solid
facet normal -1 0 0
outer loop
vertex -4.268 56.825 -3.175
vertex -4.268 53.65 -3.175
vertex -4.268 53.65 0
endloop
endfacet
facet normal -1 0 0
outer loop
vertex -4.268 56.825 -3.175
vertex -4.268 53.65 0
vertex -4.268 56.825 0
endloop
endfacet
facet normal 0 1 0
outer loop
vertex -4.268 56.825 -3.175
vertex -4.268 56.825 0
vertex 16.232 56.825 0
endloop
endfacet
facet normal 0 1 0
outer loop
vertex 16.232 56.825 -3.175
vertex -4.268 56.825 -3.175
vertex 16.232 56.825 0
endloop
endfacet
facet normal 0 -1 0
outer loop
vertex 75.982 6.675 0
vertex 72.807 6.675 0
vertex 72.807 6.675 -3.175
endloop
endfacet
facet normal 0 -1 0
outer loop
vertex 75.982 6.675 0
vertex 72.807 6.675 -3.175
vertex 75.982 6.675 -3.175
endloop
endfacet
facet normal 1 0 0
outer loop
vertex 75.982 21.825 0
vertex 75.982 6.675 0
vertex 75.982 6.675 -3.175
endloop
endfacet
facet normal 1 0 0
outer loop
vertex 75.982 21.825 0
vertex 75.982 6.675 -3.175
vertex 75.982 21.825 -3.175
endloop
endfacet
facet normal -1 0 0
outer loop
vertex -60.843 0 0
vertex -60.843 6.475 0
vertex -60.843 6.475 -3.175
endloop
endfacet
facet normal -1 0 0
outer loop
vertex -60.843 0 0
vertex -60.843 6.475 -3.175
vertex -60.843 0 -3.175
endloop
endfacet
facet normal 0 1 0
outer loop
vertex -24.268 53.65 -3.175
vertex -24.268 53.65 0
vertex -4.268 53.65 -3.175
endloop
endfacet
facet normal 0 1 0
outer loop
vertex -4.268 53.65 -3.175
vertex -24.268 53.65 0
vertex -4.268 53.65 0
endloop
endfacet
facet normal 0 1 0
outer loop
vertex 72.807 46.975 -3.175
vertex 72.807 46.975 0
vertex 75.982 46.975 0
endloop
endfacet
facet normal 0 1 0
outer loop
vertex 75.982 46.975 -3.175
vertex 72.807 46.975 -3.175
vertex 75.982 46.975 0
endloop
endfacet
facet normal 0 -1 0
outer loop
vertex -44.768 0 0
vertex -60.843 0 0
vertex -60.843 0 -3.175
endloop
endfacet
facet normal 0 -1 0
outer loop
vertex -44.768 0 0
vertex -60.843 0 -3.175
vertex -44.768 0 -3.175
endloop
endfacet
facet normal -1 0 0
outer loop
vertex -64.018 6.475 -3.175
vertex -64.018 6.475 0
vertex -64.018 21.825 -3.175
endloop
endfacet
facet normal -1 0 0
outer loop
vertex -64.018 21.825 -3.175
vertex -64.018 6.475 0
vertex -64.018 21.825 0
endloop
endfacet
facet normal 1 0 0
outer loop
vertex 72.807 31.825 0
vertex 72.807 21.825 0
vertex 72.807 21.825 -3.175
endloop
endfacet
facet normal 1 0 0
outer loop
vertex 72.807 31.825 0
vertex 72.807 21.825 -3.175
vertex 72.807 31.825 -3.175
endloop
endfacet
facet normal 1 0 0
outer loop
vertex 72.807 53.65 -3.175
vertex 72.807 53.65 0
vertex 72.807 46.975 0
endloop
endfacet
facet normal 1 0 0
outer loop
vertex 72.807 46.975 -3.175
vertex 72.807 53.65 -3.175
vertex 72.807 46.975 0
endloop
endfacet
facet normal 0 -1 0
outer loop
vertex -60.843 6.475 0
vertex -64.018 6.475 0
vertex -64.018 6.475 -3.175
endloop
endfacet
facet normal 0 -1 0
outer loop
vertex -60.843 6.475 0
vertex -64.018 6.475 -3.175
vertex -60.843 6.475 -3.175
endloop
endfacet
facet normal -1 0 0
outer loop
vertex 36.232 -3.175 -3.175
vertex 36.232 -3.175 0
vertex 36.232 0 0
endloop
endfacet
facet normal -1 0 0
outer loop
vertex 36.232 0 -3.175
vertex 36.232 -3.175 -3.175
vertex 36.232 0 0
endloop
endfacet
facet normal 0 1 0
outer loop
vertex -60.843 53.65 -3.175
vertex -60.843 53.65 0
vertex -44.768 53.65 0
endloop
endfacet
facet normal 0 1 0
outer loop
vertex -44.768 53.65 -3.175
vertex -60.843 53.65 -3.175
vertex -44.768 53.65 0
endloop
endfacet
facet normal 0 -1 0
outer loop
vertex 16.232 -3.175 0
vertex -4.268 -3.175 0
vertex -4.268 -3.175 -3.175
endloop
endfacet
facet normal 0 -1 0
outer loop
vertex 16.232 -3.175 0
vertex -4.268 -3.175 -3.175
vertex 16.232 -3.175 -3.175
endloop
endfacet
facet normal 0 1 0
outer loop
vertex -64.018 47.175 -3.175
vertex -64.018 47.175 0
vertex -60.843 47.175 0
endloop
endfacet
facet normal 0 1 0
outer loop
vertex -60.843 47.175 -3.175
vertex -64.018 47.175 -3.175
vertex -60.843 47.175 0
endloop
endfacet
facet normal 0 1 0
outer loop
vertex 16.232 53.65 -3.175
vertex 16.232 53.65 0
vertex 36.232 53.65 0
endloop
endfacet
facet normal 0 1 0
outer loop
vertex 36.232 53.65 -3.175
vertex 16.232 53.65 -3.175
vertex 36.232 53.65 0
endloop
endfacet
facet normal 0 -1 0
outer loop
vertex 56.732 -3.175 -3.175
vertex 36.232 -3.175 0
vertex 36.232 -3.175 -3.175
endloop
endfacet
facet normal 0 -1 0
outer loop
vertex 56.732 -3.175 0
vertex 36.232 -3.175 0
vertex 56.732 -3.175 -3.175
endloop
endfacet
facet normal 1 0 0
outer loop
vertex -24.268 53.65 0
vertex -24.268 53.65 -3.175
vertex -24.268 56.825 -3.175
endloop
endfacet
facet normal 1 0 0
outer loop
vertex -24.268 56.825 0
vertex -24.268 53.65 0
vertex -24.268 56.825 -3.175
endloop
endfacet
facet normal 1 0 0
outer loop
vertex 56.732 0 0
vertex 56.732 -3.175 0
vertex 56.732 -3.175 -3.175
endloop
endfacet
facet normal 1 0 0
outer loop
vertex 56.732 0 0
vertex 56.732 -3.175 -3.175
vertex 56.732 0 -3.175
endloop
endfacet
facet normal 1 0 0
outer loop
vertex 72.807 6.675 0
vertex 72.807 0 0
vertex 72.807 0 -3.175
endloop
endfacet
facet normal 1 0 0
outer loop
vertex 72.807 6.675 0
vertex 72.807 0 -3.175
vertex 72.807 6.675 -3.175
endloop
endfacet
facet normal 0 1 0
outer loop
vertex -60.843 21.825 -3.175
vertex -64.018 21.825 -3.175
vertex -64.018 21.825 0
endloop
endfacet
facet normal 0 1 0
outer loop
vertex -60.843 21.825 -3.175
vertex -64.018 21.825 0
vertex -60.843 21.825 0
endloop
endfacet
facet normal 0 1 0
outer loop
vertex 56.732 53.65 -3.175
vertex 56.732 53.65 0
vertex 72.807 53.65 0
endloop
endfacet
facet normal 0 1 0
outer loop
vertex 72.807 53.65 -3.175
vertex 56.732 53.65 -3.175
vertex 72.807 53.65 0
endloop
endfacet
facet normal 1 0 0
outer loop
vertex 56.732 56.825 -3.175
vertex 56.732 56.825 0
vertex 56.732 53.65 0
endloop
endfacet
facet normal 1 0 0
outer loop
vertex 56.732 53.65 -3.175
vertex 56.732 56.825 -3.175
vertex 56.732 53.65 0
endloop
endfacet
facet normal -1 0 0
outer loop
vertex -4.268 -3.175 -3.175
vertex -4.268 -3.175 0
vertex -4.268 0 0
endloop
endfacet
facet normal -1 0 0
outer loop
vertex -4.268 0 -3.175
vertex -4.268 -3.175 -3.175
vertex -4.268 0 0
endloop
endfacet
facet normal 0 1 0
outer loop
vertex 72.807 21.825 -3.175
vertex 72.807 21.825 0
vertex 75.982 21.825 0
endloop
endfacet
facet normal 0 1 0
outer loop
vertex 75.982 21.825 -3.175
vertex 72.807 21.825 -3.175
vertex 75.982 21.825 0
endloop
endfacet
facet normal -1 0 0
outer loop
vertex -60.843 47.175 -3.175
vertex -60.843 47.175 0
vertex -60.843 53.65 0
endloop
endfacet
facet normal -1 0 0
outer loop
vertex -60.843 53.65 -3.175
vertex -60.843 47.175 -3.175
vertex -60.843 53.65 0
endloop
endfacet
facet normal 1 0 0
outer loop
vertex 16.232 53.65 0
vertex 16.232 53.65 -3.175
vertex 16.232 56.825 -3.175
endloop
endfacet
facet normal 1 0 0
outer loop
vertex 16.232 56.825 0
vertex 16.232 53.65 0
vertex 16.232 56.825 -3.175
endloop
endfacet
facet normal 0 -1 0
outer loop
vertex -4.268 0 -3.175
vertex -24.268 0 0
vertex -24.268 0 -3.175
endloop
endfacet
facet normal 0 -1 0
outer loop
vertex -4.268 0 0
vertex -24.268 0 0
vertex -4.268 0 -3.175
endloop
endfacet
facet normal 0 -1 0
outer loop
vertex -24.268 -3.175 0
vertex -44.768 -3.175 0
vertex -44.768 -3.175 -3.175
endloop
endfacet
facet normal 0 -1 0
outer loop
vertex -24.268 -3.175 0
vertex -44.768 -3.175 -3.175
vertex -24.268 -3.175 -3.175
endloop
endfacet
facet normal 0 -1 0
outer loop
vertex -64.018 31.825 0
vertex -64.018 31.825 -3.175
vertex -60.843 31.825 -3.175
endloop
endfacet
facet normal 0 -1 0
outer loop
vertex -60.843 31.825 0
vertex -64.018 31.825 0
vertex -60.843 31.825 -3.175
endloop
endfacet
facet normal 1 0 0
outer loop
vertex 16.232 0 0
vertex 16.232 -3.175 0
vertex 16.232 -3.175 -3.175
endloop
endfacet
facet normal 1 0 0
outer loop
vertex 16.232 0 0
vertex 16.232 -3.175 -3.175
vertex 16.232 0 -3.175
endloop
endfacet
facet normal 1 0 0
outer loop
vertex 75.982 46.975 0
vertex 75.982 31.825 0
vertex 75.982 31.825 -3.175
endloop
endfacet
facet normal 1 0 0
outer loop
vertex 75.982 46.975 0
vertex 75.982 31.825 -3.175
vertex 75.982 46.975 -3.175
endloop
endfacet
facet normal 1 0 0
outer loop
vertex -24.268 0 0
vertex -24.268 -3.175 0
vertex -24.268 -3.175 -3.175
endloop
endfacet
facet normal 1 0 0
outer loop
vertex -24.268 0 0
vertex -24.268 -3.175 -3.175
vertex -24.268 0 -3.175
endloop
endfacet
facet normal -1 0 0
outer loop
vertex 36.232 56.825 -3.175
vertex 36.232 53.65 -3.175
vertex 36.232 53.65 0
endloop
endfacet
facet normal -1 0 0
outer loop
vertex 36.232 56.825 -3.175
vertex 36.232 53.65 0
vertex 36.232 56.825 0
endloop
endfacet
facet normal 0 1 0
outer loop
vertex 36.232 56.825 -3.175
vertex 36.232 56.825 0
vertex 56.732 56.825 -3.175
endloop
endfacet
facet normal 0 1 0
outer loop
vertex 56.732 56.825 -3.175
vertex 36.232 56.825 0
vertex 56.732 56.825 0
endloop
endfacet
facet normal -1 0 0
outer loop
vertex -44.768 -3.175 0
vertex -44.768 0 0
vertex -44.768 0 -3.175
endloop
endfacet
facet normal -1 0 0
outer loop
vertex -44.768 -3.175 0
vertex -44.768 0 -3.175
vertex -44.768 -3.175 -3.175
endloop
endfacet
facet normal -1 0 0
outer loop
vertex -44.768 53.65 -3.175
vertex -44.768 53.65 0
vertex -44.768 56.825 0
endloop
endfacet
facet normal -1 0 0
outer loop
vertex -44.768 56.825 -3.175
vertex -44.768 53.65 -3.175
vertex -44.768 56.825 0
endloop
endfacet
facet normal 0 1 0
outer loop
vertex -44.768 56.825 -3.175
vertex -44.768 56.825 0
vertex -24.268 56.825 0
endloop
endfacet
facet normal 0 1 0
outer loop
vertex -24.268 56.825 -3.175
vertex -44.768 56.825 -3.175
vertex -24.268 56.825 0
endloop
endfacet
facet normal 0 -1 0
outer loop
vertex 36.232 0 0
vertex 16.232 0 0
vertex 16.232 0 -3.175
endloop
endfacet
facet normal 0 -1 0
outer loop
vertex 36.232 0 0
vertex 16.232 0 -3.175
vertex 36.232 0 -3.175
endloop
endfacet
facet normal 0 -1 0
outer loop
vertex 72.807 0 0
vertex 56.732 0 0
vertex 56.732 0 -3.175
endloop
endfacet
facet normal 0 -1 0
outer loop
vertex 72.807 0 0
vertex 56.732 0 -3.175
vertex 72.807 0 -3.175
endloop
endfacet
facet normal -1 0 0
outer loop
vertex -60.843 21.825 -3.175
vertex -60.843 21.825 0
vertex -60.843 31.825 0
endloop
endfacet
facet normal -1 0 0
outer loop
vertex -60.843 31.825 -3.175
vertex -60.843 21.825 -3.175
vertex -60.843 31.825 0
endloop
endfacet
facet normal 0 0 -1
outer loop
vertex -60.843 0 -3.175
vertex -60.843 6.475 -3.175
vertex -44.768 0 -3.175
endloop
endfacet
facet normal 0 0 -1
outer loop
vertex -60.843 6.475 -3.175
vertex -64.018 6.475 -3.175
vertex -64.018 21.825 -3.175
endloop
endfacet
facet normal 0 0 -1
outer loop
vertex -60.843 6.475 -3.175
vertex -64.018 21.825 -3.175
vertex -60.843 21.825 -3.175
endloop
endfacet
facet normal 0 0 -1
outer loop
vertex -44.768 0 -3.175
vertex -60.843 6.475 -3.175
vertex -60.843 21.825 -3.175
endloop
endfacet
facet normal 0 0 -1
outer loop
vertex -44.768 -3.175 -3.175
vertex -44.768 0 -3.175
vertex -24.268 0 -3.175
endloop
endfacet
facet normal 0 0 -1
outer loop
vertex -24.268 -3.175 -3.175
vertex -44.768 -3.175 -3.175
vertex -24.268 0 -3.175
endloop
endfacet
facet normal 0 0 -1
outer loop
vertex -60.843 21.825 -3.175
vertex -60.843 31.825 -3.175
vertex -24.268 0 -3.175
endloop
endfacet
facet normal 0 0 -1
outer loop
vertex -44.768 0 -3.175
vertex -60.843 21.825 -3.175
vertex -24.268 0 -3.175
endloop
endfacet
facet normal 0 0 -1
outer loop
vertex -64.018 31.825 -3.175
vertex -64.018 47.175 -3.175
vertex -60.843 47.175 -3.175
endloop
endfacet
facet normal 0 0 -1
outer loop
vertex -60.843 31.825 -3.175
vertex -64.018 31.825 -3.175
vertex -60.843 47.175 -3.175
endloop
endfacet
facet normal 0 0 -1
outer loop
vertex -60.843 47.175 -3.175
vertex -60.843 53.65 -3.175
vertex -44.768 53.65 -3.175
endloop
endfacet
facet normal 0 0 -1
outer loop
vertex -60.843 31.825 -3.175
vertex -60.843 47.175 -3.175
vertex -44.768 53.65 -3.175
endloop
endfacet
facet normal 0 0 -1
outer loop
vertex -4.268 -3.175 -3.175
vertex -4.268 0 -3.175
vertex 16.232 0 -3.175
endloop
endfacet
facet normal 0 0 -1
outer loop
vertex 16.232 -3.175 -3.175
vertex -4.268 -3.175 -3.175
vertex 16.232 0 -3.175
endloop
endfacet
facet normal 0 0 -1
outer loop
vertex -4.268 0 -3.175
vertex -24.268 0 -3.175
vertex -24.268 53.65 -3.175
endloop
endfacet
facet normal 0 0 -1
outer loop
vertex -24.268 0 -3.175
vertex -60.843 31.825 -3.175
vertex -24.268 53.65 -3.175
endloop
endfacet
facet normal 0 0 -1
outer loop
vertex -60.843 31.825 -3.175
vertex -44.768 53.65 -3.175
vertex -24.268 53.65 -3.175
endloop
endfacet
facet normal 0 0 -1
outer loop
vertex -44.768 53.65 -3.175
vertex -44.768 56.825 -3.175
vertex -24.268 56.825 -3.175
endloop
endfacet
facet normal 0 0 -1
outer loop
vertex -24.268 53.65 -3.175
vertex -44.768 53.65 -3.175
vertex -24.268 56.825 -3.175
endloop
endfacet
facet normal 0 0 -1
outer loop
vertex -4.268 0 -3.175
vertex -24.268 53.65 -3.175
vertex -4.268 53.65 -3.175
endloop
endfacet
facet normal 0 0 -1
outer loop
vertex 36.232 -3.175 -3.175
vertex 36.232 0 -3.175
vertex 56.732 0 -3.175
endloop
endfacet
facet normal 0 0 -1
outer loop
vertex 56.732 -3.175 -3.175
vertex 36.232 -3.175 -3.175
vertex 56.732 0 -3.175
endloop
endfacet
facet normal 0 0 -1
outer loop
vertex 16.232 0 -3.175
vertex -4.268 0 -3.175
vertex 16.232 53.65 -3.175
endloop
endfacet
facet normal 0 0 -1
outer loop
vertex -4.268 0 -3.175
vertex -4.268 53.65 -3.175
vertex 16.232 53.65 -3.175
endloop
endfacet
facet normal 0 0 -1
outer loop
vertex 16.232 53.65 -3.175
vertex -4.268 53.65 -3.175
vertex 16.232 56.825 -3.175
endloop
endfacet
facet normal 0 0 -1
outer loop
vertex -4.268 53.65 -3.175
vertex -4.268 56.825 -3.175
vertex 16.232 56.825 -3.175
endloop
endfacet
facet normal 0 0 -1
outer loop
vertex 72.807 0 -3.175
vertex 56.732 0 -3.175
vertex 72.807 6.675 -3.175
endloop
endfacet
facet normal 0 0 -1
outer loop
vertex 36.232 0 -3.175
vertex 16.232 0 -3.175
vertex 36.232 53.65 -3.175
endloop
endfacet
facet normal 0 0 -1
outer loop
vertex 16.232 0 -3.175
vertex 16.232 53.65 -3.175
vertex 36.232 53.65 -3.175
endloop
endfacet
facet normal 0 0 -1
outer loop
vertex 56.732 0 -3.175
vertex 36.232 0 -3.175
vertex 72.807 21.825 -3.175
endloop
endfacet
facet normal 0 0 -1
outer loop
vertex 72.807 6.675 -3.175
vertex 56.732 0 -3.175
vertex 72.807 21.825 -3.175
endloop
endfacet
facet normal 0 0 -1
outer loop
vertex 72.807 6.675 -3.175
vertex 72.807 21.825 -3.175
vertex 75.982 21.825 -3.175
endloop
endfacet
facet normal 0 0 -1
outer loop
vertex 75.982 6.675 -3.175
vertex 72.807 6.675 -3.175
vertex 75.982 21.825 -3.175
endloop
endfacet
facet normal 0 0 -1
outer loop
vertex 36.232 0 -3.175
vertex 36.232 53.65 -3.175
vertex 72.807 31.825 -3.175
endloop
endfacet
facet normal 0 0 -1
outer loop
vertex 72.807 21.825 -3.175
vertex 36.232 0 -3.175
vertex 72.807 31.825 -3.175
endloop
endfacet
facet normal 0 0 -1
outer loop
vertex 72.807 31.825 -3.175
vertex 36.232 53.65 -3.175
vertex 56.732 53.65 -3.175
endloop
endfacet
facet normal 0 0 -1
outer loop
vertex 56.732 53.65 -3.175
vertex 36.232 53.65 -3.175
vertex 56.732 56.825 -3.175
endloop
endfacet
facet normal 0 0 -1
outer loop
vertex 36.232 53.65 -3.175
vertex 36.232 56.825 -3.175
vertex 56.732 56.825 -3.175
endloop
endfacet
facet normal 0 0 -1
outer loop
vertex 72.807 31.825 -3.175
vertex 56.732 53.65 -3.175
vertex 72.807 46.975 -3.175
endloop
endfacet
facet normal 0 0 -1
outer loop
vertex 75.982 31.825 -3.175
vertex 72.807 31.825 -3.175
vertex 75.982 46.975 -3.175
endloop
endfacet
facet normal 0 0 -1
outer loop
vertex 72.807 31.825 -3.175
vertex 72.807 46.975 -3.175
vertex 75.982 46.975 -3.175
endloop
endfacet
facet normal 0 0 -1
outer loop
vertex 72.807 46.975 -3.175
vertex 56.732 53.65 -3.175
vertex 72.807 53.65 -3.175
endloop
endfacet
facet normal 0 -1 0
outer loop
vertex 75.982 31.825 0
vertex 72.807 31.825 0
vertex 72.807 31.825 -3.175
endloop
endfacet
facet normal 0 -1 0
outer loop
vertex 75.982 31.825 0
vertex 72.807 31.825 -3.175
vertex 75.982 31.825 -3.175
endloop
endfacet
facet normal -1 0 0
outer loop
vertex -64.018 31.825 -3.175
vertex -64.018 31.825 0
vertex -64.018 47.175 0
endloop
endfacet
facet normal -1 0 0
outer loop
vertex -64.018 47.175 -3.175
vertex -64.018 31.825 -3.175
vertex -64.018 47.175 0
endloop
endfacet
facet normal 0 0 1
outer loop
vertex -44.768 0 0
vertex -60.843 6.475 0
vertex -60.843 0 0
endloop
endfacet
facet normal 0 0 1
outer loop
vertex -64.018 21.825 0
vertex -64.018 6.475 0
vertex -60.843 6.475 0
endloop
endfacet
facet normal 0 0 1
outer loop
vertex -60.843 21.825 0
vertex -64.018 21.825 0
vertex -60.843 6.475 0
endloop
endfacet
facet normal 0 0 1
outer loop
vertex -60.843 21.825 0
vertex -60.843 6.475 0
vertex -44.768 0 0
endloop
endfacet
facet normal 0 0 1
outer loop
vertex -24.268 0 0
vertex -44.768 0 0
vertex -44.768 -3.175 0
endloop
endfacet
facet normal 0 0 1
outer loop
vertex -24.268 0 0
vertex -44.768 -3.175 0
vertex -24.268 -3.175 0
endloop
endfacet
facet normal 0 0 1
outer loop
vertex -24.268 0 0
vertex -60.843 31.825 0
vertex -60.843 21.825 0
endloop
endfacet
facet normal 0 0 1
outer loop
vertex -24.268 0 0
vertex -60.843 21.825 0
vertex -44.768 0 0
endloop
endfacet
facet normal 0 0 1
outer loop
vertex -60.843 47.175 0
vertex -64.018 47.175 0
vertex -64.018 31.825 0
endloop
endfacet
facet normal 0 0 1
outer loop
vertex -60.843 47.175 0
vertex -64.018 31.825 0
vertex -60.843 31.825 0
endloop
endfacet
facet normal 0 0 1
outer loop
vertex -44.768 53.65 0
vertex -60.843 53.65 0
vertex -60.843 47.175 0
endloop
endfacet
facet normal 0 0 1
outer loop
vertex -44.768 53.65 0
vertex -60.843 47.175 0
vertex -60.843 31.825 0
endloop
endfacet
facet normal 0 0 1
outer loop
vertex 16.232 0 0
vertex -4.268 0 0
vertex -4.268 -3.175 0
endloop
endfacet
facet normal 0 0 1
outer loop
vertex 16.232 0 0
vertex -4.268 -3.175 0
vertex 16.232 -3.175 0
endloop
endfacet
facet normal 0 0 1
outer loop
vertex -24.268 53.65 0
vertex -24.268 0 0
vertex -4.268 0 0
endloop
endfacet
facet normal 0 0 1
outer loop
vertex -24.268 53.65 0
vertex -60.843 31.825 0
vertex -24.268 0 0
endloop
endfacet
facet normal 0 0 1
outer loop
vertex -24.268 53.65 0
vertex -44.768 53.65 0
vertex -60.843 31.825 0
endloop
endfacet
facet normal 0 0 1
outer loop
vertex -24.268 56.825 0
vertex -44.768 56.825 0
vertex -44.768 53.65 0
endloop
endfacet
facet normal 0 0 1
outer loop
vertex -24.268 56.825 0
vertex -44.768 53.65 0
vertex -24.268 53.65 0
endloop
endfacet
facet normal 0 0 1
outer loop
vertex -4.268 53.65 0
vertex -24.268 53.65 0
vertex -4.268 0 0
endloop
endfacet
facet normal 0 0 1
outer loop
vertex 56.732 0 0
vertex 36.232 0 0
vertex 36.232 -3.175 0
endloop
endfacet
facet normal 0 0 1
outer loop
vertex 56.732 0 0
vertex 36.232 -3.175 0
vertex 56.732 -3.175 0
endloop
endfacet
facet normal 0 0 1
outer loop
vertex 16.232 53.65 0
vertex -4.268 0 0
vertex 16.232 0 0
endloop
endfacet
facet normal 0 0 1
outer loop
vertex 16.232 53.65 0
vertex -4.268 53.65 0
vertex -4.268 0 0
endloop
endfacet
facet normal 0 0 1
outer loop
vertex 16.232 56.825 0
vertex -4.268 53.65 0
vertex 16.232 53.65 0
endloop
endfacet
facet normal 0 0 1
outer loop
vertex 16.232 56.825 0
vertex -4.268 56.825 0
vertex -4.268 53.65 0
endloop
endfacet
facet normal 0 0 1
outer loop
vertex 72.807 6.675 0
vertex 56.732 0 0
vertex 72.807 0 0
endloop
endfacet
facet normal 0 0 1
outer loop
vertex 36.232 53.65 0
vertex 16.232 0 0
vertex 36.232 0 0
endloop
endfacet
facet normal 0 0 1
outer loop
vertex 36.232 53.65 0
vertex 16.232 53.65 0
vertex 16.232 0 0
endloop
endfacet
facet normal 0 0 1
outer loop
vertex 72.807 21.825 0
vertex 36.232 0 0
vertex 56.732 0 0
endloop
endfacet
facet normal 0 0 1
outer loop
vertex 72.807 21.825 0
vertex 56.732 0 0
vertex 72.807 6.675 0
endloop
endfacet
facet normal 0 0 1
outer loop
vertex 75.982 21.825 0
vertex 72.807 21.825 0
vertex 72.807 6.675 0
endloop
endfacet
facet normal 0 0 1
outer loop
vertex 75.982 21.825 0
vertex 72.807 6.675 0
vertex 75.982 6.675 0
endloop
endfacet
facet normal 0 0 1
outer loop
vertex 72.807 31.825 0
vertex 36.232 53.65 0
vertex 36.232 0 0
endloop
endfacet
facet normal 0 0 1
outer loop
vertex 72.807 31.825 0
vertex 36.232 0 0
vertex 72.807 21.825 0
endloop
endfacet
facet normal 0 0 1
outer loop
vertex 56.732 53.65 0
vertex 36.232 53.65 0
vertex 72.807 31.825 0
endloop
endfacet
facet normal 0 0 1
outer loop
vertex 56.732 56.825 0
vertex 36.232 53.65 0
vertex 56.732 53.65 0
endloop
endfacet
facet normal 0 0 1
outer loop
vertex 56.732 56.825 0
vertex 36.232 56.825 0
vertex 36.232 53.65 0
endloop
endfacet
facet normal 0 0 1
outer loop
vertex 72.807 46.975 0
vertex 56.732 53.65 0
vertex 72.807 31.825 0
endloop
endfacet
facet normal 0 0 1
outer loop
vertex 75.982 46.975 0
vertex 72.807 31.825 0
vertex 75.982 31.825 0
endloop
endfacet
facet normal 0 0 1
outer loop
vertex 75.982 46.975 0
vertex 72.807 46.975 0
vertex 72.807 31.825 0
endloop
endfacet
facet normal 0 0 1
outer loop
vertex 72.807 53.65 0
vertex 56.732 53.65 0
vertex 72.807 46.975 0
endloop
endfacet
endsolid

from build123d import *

# Parameters (mm, degrees)
SKETCH1_W           = 140
SKETCH1_H           = 60
BOSS_EXTRUDE1_DEPTH = 3.175
SKETCH2_W           = 20
SKETCH2_H           = 3.175
SKETCH2_W_2         = 3.175
SKETCH2_H_2         = 10
CUT_EXTRUDE1_DEPTH  = 3.175


with BuildPart() as part:
    # Sketch1 → Boss-Extrude1 (new body)
    with BuildSketch(Plane.XY):
        with Locations((5.981871877, 26.825)):
            Rectangle(SKETCH1_W, SKETCH1_H)
    extrude(amount=-BOSS_EXTRUDE1_DEPTH)

    # Sketch2 → Cut-Extrude1 (cut)
    with BuildSketch(Plane.XY):
        Polygon((-60.843128123, 0), (-44.768128123, 0), (-44.768128123, -3.175), (-64.018128123, -3.175), (-64.018128123, 0), (-64.018128123, 6.475), (-60.843128123, 6.475), align=None)
        Polygon((56.731871877, 0), (72.806871877, 0), (72.806871877, 6.675), (75.981871877, 6.675), (75.981871877, 0), (75.981871877, -3.175), (56.731871877, -3.175), align=None)
        Polygon((75.981871877, 46.975), (75.981871877, 53.65), (75.981871877, 56.825), (56.731871877, 56.825), (56.731871877, 53.65), (72.806871877, 53.65), (72.806871877, 46.975), align=None)
        with Locations((26.231871877, 55.2375)):
            Rectangle(SKETCH2_W, SKETCH2_H)
        with Locations((-14.268128123, 55.2375)):
            Rectangle(SKETCH2_W, SKETCH2_H)
        Polygon((-64.018128123, 56.825), (-64.018128123, 53.65), (-64.018128123, 47.175), (-60.843128123, 47.175), (-60.843128123, 53.65), (-44.768128123, 53.65), (-44.768128123, 56.825), align=None)
        with Locations((74.394371877, 26.825)):
            Rectangle(SKETCH2_W_2, SKETCH2_H_2)
        with Locations((-62.430628123, 26.825)):
            Rectangle(SKETCH2_W_2, SKETCH2_H_2)
        with Locations((-14.268128123, -1.5875)):
            Rectangle(SKETCH2_W, SKETCH2_H)
        with Locations((26.231871877, -1.5875)):
            Rectangle(SKETCH2_W, SKETCH2_H)
    extrude(amount=-CUT_EXTRUDE1_DEPTH, mode=Mode.SUBTRACT)


solid = part.part
